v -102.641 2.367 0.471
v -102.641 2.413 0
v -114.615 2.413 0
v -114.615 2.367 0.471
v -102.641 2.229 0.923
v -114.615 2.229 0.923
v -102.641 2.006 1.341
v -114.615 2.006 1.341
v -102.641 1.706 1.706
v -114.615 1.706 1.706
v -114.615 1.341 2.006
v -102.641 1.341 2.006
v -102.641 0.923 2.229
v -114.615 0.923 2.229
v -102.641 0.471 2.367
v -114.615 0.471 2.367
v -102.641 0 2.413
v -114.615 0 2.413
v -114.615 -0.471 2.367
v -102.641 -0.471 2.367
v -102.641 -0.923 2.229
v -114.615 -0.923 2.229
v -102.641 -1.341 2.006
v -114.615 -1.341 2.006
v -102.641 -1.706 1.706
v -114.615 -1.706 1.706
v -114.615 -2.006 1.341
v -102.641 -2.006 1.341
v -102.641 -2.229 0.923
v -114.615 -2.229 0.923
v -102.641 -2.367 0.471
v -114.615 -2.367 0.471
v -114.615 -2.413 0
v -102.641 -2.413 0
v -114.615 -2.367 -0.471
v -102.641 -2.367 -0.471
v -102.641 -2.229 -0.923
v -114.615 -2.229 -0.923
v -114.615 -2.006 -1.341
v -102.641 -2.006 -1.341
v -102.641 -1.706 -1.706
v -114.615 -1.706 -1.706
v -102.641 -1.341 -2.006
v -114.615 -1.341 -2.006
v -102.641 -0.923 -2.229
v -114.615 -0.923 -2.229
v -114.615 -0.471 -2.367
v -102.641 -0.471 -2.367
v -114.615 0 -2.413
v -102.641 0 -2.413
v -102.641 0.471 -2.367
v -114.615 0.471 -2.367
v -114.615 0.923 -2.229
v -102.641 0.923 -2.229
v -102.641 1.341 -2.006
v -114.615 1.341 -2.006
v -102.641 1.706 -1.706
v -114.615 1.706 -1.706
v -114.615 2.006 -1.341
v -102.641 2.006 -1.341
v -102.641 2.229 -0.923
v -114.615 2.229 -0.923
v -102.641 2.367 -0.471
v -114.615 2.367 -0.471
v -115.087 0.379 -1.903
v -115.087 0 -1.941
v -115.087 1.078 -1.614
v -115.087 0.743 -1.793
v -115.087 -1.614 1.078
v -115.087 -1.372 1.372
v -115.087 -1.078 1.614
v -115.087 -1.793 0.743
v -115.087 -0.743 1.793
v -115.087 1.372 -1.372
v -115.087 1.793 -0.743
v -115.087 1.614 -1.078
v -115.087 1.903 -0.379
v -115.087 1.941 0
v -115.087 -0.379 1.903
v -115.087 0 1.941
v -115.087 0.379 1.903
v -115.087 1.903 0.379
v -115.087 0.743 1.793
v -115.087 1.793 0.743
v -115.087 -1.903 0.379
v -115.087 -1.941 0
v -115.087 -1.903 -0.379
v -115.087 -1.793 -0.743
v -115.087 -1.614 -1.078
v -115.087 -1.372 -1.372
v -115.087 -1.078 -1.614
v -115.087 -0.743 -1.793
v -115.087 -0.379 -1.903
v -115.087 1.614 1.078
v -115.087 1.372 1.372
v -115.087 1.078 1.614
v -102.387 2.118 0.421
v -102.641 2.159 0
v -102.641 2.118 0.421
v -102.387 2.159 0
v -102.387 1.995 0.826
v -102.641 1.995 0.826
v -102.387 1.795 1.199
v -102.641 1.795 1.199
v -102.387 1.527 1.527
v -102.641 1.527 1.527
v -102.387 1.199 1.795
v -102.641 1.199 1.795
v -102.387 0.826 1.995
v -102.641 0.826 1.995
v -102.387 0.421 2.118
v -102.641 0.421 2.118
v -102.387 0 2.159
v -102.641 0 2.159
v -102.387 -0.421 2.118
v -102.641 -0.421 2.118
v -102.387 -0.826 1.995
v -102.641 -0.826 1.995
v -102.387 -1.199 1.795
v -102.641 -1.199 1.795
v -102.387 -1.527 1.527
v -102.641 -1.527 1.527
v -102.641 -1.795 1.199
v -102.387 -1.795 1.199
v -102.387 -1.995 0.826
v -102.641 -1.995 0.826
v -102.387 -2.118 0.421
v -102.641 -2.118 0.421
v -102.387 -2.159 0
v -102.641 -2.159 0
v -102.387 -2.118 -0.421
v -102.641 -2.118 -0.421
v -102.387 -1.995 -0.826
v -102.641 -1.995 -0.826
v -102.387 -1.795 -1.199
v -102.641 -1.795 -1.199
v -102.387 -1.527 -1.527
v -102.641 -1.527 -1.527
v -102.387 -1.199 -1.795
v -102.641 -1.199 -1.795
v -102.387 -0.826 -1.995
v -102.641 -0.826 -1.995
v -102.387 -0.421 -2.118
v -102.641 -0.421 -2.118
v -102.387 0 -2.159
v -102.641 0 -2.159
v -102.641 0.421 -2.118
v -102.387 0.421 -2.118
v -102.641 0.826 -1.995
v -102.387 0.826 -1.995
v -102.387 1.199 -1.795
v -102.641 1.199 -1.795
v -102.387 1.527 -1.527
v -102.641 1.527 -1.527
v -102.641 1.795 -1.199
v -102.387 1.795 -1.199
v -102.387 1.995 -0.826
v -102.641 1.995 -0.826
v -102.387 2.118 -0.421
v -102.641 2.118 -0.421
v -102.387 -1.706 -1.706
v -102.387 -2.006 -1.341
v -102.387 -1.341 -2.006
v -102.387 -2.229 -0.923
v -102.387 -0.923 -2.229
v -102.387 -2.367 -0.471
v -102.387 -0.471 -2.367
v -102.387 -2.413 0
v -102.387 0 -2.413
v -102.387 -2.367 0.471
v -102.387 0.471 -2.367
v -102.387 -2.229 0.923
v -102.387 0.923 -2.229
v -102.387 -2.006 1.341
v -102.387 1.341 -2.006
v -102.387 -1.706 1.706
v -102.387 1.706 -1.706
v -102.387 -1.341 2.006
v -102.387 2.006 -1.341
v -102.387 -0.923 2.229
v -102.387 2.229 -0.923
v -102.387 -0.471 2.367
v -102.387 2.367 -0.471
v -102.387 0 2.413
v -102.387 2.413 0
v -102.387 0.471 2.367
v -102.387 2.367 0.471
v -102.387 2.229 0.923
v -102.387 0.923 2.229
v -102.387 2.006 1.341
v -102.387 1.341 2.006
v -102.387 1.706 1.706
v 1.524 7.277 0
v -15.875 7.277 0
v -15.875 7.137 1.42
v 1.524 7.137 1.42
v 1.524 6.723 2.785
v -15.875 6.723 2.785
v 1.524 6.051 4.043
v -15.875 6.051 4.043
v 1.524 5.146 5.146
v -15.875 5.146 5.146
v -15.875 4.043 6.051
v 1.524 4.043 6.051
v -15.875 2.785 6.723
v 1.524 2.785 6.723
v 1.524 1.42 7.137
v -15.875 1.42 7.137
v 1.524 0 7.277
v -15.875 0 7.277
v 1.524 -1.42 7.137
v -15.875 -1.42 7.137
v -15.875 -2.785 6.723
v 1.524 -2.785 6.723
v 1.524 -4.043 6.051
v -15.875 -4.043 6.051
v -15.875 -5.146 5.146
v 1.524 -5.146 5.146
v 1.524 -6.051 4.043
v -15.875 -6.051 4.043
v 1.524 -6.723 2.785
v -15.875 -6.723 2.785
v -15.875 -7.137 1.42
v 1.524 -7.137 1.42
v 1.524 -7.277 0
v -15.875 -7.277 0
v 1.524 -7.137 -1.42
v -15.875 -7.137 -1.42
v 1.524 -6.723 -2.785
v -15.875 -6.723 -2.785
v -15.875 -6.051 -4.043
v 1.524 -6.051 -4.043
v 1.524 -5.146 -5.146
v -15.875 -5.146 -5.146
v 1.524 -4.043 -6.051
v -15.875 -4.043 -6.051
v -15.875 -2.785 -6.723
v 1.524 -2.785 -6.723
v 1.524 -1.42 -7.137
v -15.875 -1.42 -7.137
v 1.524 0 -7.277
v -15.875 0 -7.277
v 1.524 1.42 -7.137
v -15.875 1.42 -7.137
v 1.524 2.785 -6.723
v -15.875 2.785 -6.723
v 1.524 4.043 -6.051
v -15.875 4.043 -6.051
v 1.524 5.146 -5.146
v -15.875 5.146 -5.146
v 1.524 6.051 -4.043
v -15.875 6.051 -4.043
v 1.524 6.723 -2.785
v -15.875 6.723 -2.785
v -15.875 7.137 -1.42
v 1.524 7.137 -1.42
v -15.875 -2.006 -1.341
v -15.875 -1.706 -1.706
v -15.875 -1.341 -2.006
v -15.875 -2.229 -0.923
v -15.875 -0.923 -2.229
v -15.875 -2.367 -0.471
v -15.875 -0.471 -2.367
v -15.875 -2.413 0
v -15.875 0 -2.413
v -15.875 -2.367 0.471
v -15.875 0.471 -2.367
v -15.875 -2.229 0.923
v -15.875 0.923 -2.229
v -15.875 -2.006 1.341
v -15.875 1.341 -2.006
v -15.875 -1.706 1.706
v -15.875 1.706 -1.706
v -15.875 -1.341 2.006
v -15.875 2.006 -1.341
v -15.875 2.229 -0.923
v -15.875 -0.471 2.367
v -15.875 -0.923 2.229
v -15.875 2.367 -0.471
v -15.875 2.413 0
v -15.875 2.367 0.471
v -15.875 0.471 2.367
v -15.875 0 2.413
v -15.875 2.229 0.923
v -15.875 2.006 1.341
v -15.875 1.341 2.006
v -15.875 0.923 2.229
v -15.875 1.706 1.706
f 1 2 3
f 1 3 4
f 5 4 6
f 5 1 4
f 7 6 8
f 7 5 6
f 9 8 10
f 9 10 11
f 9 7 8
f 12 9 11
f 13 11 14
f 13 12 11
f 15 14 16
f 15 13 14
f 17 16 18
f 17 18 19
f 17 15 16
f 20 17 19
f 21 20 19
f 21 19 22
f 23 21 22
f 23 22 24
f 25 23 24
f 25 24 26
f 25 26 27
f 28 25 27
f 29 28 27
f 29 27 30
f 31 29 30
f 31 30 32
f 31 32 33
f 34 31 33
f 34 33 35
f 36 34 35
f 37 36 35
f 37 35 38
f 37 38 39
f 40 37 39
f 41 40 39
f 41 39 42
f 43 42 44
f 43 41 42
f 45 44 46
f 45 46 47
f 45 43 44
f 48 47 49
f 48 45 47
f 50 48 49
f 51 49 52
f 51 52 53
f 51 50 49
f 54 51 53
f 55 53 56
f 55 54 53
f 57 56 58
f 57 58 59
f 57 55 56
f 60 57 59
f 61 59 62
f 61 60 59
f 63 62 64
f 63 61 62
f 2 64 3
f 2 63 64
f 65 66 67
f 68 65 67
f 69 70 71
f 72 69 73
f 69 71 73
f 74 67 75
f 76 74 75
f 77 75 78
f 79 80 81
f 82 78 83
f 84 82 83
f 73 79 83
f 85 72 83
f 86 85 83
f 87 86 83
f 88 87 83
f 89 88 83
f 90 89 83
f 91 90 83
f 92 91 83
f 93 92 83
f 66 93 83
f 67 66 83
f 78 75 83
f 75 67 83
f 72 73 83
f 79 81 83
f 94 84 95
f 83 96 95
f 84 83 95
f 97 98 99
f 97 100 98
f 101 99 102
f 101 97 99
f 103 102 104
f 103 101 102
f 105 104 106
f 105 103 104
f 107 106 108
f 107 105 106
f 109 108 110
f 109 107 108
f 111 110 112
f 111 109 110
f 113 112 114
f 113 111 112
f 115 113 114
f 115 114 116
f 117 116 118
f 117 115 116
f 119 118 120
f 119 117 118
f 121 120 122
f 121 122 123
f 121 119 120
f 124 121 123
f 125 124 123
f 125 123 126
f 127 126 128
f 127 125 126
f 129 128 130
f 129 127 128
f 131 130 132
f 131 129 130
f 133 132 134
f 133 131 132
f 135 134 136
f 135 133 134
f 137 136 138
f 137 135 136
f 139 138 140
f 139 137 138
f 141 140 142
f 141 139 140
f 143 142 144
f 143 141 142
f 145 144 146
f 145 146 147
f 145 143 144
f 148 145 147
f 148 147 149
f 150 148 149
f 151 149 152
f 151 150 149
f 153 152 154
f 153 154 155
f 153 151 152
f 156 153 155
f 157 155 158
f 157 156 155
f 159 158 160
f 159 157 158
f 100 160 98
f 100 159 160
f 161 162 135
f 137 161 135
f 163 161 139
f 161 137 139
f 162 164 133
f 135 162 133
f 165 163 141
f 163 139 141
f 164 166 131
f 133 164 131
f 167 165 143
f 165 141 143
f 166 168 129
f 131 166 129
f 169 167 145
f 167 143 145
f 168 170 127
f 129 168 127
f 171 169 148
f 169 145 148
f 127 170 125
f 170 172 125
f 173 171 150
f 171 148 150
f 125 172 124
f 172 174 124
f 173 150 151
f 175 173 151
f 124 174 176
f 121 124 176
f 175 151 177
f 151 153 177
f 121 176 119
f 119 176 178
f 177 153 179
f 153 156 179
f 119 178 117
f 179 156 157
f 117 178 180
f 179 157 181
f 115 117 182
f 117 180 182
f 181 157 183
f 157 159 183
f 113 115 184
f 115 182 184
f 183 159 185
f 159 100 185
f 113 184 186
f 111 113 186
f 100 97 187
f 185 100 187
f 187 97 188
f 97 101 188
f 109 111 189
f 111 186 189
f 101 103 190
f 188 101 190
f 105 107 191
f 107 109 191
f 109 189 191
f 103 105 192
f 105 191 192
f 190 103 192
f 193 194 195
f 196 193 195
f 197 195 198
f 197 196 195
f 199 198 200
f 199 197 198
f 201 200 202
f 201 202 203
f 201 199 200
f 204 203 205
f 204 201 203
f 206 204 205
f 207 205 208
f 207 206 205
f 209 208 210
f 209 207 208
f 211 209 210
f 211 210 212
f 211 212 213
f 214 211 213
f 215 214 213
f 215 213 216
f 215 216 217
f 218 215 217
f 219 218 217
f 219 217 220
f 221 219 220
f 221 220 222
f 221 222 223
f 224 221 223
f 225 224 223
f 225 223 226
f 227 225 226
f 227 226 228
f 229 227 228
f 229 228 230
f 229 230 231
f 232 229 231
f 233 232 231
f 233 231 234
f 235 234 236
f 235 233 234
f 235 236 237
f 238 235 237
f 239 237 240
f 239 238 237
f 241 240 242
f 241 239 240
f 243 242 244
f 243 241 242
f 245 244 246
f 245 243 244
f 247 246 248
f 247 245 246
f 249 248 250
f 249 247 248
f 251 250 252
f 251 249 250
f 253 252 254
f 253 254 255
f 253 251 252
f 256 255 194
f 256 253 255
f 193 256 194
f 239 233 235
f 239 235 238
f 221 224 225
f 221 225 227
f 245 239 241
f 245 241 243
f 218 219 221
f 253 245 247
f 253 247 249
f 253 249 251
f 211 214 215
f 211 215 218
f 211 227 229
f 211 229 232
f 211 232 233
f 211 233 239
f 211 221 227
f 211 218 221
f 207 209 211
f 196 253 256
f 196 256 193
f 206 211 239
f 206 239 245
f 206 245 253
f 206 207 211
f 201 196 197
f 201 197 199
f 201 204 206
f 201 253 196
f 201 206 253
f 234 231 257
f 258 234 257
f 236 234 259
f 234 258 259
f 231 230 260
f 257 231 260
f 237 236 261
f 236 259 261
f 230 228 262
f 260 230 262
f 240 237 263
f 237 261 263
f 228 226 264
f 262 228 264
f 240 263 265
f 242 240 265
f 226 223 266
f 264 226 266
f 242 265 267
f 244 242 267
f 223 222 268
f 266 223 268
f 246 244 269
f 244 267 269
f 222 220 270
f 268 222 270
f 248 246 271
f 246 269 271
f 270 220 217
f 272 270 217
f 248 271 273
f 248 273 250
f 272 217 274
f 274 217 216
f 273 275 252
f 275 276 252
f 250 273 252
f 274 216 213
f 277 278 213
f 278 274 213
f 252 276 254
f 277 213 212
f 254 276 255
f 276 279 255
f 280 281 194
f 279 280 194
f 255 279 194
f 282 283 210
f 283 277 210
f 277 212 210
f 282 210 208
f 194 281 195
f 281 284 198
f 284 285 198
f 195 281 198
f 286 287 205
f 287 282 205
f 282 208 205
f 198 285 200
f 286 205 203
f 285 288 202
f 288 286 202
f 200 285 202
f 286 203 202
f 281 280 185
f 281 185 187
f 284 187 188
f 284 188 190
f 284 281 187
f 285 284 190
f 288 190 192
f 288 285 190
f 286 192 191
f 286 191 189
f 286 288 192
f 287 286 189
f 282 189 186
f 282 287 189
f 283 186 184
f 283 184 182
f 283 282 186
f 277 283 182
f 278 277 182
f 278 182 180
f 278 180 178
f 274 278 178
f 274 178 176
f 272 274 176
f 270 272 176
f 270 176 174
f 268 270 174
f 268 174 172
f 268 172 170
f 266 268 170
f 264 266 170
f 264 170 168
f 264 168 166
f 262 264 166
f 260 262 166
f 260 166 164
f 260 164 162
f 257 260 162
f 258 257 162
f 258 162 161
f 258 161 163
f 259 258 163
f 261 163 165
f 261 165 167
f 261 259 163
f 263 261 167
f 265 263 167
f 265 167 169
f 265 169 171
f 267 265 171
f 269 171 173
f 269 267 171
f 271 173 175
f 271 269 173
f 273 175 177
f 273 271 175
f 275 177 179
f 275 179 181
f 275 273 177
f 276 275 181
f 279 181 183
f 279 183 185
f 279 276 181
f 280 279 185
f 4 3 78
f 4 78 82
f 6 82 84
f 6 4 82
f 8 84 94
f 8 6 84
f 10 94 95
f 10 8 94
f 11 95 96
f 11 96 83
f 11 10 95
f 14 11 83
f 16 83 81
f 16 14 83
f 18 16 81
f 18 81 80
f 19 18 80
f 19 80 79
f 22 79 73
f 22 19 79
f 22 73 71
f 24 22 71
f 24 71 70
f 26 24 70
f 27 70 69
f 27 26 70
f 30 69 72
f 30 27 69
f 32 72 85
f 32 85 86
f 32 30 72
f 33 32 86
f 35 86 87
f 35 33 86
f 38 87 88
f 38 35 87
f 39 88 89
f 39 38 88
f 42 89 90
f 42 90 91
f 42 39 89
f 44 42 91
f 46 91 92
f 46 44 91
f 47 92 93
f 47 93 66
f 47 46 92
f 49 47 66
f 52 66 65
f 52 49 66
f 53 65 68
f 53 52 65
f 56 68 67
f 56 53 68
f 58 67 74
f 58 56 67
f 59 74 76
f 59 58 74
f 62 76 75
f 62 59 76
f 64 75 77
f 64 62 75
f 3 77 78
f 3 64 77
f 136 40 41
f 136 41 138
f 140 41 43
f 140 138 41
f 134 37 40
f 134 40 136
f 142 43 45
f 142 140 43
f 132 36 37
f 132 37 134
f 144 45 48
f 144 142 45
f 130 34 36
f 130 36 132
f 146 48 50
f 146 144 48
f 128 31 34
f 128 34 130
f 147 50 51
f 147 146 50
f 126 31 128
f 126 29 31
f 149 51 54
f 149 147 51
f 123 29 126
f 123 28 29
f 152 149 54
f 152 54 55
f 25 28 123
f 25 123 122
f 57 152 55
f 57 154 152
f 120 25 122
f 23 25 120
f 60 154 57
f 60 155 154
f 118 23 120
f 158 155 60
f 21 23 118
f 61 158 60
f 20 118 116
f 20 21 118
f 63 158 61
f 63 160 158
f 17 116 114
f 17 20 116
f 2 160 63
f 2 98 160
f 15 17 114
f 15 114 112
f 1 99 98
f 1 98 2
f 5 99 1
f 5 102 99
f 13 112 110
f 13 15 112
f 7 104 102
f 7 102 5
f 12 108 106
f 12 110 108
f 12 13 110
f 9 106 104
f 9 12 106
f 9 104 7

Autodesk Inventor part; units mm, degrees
sketch "Sketch_3" plane through (0, 0, 0) normal (0, 0, 1) x (1, 0, 0)
  line L0 (0, 0) -> (-115.0874, 0)
  line L1 (-115.0874, 0) -> (-115.0874, 1.9406)
  line L2 (-115.0874, 1.9406) -> (-114.615, 2.413)
  line L3 (-114.615, 2.413) -> (0, 2.413)
  line L4 (0, 2.413) -> (0, 0)
  line L5 (0, 0) -> (-115.0874, 0)
revolve "Revolution1" add sketch "Sketch_3" angle 360 about axis through (0, 0, 0) along (1, 0, 0)
thread "Thread1" size "10-32 UNF" class "2A" standard "ANSI Unified Screw Threads" length 12.446 offset 102.6414
sketch "Sketch_17" plane through (0, 0, 0) normal (0, 0, 1) x (1, 0, 0)
  line L0 (115.0874, 0) -> (-115.0874, 0)
  line L1 (-102.6414, 2.413) -> (-102.6414, 2.159)
  line L2 (-102.6414, 2.159) -> (-102.3874, 2.159)
  line L3 (-102.3874, 2.159) -> (-102.3874, 2.413)
  line L4 (-102.3874, 2.413) -> (-102.6414, 2.413)
revolve "Revolution2" cut sketch "Sketch_17" angle 360 about axis through (115.0874, 0, 0) along (1, 0, 0)
sketch "Sketch_12" plane through (0, 0, 0) normal (0, 0, 1) x (1, 0, 0)
  line L0 (1.524, 0) -> (-15.875, 0)
  line L1 (-15.875, 0) -> (-15.875, 7.2771)
  line L2 (-15.875, 7.2771) -> (1.524, 7.2771)
  line L3 (1.524, 7.2771) -> (1.524, 0)
  line L4 (1.524, 0) -> (-15.875, 0)
revolve "Revolution3" add sketch "Sketch_12" angle 360 about axis through (1.524, 0, 0) along (1, 0, 0)
ref_plane "h1_XY" through (-115.0874, 0, 0) normal (0, 1, 0) x (1, 0, 0)
ref_plane "h1_YZ" through (-115.0874, 0, 0) normal (1, 0, 0) x (0, 0, -1)
ref_plane "h1_ZX" through (-115.0874, 0, 0) normal (0, 0, -1) x (0, 1, 0)
ref_plane "h2_XY" through (-102.3874, 0, 0) normal (0, 1, 0) x (1, 0, 0)
ref_plane "h2_YZ" through (-102.3874, 0, 0) normal (1, 0, 0) x (0, 0, -1)
ref_plane "h2_ZX" through (-102.3874, 0, 0) normal (0, 0, -1) x (0, 1, 0)
ref_plane "k1_XY" through (-115.0874, 0, -2.413) normal (0, 1, 0) x (1, 0, 0)
ref_plane "k1_YZ" through (-115.0874, 0, -2.413) normal (1, 0, 0) x (0, 0, -1)
ref_plane "k1_ZX" through (-115.0874, 0, -2.413) normal (0, 0, -1) x (0, 1, 0)
ref_plane "k2_XY" through (-115.0874, 0, 2.413) normal (0, 1, 0) x (1, 0, 0)
ref_plane "k2_YZ" through (-115.0874, 0, 2.413) normal (1, 0, 0) x (0, 0, -1)
ref_plane "k2_ZX" through (-115.0874, 0, 2.413) normal (0, 0, -1) x (0, 1, 0)
ref_plane "start_XY" through (-102.3874, 0, 0) normal (0, 1, 0) x (1, 0, 0)
ref_plane "start_YZ" through (-102.3874, 0, 0) normal (1, 0, 0) x (0, 0, -1)
ref_plane "start_ZX" through (-102.3874, 0, 0) normal (0, 0, -1) x (0, 1, 0)
ref_plane "to_prc_XY" through (-102.3874, 0, 0) normal (1, 0, 0) x (0, 0, -1)
ref_plane "to_prc_YZ" through (-102.3874, 0, 0) normal (0, 0, -1) x (0, 1, 0)
ref_plane "to_prc_ZX" through (-102.3874, 0, 0) normal (0, 1, 0) x (1, 0, 0)
ref_plane "to_rod_guide_XY" through (-115.0874, 0, 0) normal (1, 0, 0) x (0, 0, -1)
ref_plane "to_rod_guide_YZ" through (-115.0874, 0, 0) normal (0, 0, -1) x (0, 1, 0)
ref_plane "to_rod_guide_ZX" through (-115.0874, 0, 0) normal (0, 1, 0) x (1, 0, 0)
properties part number "D-75080.25-2XP-4.531-3pos"
